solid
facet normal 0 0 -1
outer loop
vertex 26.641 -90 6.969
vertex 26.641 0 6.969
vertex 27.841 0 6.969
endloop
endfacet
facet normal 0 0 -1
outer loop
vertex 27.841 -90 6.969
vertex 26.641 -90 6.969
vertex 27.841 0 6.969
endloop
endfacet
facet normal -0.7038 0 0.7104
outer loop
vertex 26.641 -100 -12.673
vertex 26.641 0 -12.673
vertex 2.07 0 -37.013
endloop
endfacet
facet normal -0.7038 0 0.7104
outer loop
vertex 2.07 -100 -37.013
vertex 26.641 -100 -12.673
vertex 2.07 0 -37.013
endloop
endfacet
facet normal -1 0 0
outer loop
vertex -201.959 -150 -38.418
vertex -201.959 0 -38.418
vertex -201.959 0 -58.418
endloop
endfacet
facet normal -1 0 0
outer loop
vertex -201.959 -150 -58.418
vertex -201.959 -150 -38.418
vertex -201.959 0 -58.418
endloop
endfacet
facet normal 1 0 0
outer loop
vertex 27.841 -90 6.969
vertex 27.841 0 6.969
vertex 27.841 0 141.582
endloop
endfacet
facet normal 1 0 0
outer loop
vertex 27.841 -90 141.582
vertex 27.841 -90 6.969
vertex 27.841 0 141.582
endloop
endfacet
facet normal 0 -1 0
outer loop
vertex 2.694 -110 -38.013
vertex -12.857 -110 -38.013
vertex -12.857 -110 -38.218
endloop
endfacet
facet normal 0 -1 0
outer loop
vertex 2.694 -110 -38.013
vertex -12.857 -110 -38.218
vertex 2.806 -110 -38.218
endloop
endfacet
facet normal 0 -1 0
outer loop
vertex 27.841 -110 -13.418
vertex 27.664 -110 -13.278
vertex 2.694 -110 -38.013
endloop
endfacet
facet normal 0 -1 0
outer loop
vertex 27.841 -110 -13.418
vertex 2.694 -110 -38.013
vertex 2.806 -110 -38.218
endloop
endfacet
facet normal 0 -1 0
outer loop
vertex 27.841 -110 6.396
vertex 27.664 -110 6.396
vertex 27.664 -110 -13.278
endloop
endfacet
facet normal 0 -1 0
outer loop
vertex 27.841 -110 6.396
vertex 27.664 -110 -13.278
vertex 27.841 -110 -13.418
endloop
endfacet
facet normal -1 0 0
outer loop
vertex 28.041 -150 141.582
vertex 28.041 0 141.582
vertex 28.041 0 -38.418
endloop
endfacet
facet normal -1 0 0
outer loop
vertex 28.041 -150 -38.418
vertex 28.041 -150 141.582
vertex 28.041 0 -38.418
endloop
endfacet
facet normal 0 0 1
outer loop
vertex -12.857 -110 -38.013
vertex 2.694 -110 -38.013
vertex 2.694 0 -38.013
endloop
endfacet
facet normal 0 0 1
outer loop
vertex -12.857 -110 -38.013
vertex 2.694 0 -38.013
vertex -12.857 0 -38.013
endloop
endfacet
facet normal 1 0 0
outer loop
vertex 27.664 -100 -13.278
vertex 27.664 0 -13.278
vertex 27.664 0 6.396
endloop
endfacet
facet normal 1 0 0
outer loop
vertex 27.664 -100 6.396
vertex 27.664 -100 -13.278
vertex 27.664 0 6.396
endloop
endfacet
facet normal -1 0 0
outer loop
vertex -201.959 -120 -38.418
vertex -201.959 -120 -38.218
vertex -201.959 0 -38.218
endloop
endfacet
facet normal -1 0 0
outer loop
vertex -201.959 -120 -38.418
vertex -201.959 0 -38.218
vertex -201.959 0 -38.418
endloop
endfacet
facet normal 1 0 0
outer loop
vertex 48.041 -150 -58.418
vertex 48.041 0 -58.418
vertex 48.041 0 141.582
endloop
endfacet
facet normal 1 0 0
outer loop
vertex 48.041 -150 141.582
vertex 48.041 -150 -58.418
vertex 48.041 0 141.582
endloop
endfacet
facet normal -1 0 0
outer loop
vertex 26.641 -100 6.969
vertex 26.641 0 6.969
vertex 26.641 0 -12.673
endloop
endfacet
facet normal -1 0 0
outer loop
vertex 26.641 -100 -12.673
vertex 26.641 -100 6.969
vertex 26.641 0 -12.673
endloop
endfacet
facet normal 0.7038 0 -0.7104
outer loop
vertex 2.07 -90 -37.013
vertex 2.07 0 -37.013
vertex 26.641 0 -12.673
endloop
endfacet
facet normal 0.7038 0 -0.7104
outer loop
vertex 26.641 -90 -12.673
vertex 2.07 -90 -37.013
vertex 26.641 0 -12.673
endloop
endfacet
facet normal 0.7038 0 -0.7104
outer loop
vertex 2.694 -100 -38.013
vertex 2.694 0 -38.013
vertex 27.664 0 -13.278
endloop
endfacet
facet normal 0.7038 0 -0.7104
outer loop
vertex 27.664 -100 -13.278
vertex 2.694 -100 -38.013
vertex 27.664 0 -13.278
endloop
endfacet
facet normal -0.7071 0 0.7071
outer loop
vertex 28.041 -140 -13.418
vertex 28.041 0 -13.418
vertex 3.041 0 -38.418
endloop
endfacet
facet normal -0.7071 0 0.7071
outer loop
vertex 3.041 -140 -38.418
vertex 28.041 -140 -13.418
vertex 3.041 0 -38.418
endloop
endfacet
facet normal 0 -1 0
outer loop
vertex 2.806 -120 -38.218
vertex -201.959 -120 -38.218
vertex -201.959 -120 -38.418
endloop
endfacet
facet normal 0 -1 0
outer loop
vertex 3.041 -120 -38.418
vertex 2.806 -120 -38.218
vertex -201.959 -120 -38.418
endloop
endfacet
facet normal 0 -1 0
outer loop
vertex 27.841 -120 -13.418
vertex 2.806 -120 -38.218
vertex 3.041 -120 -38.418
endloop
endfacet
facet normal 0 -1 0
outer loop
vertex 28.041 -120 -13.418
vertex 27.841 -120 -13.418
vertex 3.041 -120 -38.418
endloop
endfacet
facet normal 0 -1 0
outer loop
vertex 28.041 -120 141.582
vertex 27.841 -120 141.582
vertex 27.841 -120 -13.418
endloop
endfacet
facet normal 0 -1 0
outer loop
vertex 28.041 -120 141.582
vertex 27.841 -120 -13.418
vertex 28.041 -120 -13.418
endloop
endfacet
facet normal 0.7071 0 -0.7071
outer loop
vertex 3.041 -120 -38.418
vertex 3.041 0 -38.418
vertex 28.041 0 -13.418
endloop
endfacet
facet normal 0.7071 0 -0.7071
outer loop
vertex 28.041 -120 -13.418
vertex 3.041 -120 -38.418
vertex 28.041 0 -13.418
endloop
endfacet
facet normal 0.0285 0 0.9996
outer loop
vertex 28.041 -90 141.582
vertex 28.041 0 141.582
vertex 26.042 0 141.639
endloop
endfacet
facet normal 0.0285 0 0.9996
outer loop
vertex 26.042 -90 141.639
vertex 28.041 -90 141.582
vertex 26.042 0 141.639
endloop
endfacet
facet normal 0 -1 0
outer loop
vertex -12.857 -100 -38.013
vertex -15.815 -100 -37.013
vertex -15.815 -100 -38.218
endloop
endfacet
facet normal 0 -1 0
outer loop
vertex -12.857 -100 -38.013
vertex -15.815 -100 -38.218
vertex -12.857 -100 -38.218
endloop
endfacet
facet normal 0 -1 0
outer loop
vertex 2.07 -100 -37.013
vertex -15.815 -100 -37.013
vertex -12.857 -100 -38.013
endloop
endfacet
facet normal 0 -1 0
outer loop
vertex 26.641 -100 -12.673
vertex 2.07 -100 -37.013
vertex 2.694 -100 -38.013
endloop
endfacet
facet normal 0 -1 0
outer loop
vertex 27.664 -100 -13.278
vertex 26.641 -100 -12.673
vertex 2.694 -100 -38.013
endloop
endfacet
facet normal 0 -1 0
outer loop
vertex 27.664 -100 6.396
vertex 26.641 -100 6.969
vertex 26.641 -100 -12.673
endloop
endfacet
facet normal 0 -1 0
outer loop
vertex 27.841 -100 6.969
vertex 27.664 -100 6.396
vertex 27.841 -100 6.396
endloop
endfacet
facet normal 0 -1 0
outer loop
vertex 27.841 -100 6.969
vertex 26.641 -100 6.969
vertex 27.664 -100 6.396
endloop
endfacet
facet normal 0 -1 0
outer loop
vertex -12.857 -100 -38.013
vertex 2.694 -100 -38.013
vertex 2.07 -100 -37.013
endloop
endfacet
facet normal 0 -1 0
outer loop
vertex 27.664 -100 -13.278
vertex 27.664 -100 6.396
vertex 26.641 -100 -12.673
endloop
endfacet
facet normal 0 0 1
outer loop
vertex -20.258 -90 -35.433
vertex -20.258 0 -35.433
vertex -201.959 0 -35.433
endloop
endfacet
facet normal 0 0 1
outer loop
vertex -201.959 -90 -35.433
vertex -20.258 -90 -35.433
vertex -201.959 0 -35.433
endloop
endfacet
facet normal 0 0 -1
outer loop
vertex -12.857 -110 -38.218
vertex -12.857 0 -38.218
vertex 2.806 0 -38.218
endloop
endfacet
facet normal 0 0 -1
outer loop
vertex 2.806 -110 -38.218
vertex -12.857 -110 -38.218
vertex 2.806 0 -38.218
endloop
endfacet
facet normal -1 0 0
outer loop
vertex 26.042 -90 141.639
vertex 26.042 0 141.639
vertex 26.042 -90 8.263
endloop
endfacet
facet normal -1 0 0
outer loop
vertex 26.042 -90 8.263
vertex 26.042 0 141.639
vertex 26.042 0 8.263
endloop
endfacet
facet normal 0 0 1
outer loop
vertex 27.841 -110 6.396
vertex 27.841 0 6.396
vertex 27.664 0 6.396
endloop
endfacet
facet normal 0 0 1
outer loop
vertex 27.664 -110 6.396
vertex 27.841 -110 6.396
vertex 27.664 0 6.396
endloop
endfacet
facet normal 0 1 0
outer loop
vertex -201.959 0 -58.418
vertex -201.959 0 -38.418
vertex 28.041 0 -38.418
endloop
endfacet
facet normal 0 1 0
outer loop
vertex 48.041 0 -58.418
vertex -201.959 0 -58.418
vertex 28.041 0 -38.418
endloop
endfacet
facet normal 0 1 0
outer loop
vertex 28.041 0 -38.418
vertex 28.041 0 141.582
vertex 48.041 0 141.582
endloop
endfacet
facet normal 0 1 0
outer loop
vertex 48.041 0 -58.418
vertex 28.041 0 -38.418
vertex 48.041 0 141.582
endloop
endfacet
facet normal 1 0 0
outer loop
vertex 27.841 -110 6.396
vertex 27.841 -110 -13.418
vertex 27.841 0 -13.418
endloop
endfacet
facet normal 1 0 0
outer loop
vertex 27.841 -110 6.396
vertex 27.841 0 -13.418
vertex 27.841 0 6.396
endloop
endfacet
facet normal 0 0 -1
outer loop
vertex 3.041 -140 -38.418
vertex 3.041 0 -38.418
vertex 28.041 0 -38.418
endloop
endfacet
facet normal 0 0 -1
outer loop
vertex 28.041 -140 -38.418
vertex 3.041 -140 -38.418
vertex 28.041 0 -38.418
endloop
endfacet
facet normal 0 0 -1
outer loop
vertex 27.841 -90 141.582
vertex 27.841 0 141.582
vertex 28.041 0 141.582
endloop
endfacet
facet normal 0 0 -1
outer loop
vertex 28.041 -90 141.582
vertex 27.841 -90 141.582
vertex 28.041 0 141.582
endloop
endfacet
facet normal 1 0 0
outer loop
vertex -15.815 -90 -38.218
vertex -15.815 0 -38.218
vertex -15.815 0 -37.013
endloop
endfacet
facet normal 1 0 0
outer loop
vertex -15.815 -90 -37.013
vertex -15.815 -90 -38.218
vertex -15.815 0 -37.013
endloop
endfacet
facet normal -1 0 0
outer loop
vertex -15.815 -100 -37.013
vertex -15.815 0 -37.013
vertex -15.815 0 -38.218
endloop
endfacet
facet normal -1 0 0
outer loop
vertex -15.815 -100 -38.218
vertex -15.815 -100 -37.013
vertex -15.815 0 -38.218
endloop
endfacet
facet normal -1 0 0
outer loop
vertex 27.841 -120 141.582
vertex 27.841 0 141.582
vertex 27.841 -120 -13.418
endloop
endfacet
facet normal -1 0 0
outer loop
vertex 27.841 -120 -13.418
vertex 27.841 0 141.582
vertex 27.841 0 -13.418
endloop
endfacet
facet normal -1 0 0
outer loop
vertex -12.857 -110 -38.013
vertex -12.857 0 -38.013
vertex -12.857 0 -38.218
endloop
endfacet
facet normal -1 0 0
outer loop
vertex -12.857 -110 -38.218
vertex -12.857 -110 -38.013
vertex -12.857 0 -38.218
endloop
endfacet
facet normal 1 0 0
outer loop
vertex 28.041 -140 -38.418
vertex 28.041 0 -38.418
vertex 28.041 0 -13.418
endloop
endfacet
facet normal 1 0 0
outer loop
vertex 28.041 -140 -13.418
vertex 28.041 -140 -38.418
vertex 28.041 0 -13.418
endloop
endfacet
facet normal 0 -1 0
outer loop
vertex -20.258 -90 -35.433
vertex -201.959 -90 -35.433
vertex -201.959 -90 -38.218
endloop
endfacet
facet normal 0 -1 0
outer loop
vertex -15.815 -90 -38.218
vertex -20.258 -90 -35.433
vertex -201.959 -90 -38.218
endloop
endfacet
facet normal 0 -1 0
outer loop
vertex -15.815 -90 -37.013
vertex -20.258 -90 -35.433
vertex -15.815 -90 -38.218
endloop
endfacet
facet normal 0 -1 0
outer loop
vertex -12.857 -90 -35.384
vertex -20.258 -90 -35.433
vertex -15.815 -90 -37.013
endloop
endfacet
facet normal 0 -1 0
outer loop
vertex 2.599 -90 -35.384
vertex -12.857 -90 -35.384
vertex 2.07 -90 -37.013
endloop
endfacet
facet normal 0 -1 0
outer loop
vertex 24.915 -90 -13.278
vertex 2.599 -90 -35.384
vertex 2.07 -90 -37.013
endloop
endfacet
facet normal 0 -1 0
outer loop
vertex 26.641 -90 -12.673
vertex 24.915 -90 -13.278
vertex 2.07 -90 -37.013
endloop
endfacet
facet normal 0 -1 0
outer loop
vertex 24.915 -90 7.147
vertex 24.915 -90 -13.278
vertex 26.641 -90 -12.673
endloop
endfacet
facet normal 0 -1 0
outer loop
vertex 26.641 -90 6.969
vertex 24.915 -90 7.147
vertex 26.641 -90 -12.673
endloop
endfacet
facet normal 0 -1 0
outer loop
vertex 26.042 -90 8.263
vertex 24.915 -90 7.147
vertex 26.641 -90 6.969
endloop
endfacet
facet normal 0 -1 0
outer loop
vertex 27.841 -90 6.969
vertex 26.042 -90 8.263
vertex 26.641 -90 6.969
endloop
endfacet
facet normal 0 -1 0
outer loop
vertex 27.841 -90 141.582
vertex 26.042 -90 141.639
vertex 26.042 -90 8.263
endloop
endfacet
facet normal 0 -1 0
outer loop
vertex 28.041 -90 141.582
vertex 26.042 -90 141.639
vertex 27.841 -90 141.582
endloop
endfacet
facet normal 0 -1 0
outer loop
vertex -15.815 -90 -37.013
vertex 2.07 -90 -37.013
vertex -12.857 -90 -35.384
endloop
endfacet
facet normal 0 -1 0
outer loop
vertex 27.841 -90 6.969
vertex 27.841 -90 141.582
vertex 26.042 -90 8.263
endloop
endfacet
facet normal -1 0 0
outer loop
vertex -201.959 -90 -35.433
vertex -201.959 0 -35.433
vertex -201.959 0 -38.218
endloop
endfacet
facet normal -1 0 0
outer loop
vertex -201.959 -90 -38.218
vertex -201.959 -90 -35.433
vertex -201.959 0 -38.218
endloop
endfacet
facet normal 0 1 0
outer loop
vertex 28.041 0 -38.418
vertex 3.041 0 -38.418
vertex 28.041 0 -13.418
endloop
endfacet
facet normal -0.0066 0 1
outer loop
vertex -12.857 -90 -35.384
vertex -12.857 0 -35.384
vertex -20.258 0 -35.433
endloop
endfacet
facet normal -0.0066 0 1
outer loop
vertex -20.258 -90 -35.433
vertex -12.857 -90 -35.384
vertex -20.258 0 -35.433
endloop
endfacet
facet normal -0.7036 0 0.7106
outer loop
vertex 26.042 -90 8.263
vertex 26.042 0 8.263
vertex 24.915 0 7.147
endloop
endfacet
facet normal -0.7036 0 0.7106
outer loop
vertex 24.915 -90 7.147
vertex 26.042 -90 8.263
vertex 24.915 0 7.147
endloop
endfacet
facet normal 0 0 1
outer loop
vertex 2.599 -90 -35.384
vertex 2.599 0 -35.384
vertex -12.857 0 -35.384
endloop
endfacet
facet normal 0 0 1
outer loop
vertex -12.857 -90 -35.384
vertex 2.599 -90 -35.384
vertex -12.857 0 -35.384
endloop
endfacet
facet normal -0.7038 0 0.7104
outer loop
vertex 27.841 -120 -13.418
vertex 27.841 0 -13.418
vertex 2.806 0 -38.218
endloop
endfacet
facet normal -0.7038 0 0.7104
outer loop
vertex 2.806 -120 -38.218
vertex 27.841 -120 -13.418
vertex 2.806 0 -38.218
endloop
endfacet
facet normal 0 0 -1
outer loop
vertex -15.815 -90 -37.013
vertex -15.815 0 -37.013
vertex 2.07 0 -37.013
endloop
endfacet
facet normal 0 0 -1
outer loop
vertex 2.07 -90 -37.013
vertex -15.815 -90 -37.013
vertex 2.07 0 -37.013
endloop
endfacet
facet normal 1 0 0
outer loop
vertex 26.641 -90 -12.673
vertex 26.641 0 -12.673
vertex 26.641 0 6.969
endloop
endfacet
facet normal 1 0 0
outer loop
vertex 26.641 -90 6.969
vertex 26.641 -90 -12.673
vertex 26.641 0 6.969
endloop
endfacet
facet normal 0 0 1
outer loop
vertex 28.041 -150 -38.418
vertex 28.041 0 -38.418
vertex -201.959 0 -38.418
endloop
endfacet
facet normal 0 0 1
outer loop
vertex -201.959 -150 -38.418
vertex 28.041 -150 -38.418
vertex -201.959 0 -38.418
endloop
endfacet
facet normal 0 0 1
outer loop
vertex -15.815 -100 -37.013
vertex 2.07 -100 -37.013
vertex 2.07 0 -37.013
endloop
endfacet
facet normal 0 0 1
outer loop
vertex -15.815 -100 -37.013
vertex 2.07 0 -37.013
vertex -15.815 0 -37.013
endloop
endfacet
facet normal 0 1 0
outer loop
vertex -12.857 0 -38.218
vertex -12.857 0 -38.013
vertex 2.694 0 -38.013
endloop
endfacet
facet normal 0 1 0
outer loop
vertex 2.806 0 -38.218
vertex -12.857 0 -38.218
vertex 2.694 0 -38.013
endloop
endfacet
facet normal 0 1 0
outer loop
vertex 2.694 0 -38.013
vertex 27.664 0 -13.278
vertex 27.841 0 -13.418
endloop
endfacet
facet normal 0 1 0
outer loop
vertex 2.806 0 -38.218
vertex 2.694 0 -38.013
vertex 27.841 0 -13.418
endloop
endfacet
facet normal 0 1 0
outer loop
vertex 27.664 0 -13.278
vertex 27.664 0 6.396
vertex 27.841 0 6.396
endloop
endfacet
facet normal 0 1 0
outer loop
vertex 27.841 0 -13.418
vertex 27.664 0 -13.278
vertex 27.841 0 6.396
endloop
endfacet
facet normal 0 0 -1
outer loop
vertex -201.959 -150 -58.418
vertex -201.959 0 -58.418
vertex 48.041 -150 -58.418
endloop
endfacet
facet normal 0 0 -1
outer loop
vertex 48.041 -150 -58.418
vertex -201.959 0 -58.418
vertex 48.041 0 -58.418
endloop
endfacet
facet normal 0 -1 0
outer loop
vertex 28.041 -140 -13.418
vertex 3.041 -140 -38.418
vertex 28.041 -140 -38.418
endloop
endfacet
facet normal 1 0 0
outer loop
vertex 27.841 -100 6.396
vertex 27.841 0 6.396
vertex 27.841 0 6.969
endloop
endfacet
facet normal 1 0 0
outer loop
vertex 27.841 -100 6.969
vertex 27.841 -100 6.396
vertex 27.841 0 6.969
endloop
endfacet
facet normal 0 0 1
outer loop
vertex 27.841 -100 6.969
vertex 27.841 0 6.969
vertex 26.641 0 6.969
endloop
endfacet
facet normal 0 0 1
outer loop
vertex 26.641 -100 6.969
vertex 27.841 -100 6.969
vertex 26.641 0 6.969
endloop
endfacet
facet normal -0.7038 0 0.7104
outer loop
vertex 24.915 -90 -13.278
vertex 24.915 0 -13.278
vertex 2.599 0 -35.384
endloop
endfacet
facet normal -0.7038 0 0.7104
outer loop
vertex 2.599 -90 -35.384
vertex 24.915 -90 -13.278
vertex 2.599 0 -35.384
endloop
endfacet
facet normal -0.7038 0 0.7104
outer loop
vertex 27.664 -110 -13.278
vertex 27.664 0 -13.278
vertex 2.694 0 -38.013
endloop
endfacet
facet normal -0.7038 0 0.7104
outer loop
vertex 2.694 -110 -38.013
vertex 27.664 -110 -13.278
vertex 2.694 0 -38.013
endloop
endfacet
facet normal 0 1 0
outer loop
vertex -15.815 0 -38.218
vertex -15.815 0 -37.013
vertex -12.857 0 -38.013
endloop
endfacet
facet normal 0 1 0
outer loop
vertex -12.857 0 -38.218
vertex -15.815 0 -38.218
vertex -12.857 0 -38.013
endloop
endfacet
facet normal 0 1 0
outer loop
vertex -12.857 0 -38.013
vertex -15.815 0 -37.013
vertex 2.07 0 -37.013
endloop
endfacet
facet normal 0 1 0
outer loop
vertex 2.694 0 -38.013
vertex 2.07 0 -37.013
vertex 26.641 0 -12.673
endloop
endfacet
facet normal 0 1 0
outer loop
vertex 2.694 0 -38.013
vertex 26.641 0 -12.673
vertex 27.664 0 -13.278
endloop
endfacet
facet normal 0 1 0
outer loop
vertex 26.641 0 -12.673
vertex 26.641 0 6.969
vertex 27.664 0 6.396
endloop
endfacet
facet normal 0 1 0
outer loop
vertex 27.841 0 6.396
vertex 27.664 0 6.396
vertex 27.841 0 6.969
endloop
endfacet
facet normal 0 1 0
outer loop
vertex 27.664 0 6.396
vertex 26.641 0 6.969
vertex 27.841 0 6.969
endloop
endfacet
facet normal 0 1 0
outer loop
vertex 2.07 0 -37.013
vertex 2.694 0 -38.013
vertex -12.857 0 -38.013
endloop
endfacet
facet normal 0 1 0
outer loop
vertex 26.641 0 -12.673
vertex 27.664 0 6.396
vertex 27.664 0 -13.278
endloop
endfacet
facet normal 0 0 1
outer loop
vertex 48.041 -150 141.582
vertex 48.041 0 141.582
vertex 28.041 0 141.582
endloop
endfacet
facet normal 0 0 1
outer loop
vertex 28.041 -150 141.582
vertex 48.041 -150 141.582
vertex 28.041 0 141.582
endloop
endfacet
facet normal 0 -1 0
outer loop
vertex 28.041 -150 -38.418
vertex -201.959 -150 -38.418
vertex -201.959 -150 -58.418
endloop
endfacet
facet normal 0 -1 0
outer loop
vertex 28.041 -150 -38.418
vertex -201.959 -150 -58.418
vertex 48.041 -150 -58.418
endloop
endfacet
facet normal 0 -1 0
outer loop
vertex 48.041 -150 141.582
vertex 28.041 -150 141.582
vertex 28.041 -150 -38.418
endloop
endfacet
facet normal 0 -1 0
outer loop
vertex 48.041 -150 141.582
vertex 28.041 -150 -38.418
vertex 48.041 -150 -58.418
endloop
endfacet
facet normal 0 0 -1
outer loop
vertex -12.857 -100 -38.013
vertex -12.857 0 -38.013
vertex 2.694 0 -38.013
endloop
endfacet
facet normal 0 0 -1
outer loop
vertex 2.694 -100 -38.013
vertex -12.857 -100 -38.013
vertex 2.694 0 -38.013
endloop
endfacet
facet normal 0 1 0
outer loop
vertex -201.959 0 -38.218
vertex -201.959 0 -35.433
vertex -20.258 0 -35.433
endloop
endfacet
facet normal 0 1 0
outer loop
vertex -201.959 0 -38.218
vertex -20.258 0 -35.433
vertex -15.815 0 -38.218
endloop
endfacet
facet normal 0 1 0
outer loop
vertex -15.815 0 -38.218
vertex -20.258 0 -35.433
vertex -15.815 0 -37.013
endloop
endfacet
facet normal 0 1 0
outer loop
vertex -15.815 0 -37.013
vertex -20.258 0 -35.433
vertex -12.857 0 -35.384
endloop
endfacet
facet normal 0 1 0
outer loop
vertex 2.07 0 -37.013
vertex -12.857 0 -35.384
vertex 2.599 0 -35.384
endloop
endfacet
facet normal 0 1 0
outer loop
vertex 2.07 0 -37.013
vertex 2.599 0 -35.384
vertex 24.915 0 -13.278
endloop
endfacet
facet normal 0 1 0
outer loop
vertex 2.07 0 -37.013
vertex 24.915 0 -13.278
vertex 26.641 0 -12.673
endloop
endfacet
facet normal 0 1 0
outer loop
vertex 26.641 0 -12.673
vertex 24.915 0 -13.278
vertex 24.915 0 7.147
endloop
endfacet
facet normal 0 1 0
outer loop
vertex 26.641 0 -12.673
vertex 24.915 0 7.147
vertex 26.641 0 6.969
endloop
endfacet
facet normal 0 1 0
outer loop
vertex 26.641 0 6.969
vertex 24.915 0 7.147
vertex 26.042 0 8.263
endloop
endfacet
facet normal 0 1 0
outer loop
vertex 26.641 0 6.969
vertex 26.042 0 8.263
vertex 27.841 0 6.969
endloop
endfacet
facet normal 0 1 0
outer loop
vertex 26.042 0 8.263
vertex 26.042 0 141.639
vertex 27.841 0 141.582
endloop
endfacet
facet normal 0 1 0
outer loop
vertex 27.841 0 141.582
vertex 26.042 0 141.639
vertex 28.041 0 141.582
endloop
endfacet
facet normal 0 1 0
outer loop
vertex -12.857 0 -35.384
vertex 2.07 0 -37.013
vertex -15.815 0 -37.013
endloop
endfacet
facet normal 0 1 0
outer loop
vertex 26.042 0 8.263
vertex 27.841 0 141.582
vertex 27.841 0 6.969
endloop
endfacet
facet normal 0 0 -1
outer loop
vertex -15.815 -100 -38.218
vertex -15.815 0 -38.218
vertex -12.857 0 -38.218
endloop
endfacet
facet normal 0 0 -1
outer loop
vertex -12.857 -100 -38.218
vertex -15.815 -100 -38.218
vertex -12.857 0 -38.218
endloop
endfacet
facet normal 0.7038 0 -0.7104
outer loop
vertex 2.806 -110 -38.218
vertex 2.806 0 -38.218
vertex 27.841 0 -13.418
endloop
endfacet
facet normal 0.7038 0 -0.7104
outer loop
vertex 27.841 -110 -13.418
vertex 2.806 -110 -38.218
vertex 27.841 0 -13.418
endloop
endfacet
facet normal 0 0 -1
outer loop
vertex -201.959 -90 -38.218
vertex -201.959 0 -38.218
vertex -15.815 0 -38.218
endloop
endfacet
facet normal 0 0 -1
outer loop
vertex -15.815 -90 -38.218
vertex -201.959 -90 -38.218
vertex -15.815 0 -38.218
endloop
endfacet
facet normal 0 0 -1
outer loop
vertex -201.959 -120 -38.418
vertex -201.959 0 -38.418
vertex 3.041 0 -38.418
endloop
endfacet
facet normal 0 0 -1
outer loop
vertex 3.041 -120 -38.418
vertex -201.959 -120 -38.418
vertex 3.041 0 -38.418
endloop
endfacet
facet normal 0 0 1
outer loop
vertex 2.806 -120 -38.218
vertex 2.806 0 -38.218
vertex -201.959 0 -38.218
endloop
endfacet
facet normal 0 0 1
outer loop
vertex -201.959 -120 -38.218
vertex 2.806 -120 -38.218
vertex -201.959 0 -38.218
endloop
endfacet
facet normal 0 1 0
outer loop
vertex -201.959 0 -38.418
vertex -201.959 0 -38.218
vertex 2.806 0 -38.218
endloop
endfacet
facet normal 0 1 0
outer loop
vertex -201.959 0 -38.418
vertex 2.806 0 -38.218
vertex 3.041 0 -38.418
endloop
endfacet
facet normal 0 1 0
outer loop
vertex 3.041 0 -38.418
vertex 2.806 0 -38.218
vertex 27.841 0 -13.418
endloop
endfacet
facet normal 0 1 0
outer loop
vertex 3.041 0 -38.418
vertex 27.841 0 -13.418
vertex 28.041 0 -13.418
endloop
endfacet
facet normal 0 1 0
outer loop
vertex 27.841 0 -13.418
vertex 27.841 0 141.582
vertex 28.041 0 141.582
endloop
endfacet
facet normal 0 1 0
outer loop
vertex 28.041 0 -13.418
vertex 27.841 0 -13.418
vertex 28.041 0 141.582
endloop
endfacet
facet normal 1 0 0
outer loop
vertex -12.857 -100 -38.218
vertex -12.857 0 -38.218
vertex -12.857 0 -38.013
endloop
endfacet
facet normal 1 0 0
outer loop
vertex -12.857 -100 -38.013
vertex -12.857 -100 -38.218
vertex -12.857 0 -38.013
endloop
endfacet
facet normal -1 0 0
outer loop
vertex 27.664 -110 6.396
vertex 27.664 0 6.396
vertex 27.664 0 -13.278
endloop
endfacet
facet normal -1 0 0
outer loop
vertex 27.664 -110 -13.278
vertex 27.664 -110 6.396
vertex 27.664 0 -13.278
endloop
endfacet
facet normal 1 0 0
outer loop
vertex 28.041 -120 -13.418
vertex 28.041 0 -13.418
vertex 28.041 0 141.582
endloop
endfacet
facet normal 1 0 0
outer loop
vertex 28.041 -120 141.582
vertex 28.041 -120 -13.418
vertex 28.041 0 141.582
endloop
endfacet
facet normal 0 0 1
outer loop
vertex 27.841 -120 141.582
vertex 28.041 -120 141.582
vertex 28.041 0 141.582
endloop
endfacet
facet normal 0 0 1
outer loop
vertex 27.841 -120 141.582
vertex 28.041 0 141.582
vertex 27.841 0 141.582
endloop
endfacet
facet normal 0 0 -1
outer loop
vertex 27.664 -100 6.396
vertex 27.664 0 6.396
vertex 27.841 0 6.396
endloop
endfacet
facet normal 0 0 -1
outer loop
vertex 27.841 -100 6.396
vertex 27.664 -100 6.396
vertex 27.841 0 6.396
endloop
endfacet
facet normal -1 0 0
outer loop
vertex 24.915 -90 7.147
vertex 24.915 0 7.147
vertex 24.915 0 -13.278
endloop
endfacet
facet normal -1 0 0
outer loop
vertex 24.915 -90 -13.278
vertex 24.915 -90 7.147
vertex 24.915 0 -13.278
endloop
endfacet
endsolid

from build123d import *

# Parameters (mm, degrees)
F1_DEPTH = 150
F2_DEPTH = 140
F3_DEPTH = 120
F4_DEPTH = 110
F5_DEPTH = 100
F6_DEPTH = 90


with BuildPart() as f1:
    # F0 (on Front) → F1 (new body)
    with BuildSketch(Plane.XZ):
        Polygon((3.041143, -38.418245), (-201.958857, -38.418245), (-201.958857, -58.418245), (48.041143, -58.418245), (48.041143, 141.581755), (28.041143, 141.581755), (28.041143, -13.418245), (28.041143, -38.418245), align=None)
    extrude(amount=F1_DEPTH)


with BuildPart() as f2:
    # F0 (on Front) → F2 (new body)
    with BuildSketch(Plane.XZ):
        Polygon((28.041143, -13.418245), (3.041143, -38.418245), (28.041143, -38.418245), align=None)
    extrude(amount=F2_DEPTH)


with BuildPart() as f3:
    # F0 (on Front) → F3 (new body)
    with BuildSketch(Plane.XZ):
        Polygon((-201.958857, -38.218245), (-201.958857, -38.418245), (3.041143, -38.418245), (28.041143, -13.418245), (28.041143, 141.581755), (27.841143, 141.581755), (27.841143, 6.968897), (27.841143, 6.396026), (27.841143, -13.418245), (2.805682, -38.218245), (-12.857123, -38.218245), (-15.815426, -38.218245), align=None)
    extrude(amount=F3_DEPTH)


with BuildPart() as f4:
    # F0 (on Front) → F4 (new body)
    with BuildSketch(Plane.XZ):
        Polygon((-12.857123, -38.012717), (-12.857123, -38.218245), (2.805682, -38.218245), (27.841143, -13.418245), (27.841143, 6.396026), (27.663549, 6.396026), (27.663549, -13.277677), (2.693665, -38.012717), align=None)
    extrude(amount=F4_DEPTH)


with BuildPart() as f5:
    # F0 (on Front) → F5 (new body)
    with BuildSketch(Plane.XZ):
        Polygon((-15.815426, -37.012717), (-15.815426, -38.218245), (-12.857123, -38.218245), (-12.857123, -38.012717), (2.693665, -38.012717), (27.663549, -13.277677), (27.663549, 6.396026), (27.841143, 6.396026), (27.841143, 6.968897), (26.641143, 6.968897), (26.641143, -12.672522), (2.069853, -37.012717), align=None)
    extrude(amount=F5_DEPTH)


with BuildPart() as f6:
    # F0 (on Front) → F6 (new body)
    with BuildSketch(Plane.XZ):
        Polygon((-201.958857, -35.43291), (-201.958857, -38.218245), (-15.815426, -38.218245), (-15.815426, -37.012717), (2.069853, -37.012717), (26.641143, -12.672522), (26.641143, 6.968897), (27.841143, 6.968897), (27.841143, 141.581755), (28.041143, 141.581755), (26.041976, 141.63947), (26.041976, 8.26286), (24.915133, 7.146615), (24.915133, -13.277677), (2.59909, -35.383835), (-12.857123, -35.383835), (-20.257614, -35.43291), align=None)
    extrude(amount=F6_DEPTH)


solid = Compound([f1.part, f2.part, f3.part, f4.part, f5.part, f6.part])
